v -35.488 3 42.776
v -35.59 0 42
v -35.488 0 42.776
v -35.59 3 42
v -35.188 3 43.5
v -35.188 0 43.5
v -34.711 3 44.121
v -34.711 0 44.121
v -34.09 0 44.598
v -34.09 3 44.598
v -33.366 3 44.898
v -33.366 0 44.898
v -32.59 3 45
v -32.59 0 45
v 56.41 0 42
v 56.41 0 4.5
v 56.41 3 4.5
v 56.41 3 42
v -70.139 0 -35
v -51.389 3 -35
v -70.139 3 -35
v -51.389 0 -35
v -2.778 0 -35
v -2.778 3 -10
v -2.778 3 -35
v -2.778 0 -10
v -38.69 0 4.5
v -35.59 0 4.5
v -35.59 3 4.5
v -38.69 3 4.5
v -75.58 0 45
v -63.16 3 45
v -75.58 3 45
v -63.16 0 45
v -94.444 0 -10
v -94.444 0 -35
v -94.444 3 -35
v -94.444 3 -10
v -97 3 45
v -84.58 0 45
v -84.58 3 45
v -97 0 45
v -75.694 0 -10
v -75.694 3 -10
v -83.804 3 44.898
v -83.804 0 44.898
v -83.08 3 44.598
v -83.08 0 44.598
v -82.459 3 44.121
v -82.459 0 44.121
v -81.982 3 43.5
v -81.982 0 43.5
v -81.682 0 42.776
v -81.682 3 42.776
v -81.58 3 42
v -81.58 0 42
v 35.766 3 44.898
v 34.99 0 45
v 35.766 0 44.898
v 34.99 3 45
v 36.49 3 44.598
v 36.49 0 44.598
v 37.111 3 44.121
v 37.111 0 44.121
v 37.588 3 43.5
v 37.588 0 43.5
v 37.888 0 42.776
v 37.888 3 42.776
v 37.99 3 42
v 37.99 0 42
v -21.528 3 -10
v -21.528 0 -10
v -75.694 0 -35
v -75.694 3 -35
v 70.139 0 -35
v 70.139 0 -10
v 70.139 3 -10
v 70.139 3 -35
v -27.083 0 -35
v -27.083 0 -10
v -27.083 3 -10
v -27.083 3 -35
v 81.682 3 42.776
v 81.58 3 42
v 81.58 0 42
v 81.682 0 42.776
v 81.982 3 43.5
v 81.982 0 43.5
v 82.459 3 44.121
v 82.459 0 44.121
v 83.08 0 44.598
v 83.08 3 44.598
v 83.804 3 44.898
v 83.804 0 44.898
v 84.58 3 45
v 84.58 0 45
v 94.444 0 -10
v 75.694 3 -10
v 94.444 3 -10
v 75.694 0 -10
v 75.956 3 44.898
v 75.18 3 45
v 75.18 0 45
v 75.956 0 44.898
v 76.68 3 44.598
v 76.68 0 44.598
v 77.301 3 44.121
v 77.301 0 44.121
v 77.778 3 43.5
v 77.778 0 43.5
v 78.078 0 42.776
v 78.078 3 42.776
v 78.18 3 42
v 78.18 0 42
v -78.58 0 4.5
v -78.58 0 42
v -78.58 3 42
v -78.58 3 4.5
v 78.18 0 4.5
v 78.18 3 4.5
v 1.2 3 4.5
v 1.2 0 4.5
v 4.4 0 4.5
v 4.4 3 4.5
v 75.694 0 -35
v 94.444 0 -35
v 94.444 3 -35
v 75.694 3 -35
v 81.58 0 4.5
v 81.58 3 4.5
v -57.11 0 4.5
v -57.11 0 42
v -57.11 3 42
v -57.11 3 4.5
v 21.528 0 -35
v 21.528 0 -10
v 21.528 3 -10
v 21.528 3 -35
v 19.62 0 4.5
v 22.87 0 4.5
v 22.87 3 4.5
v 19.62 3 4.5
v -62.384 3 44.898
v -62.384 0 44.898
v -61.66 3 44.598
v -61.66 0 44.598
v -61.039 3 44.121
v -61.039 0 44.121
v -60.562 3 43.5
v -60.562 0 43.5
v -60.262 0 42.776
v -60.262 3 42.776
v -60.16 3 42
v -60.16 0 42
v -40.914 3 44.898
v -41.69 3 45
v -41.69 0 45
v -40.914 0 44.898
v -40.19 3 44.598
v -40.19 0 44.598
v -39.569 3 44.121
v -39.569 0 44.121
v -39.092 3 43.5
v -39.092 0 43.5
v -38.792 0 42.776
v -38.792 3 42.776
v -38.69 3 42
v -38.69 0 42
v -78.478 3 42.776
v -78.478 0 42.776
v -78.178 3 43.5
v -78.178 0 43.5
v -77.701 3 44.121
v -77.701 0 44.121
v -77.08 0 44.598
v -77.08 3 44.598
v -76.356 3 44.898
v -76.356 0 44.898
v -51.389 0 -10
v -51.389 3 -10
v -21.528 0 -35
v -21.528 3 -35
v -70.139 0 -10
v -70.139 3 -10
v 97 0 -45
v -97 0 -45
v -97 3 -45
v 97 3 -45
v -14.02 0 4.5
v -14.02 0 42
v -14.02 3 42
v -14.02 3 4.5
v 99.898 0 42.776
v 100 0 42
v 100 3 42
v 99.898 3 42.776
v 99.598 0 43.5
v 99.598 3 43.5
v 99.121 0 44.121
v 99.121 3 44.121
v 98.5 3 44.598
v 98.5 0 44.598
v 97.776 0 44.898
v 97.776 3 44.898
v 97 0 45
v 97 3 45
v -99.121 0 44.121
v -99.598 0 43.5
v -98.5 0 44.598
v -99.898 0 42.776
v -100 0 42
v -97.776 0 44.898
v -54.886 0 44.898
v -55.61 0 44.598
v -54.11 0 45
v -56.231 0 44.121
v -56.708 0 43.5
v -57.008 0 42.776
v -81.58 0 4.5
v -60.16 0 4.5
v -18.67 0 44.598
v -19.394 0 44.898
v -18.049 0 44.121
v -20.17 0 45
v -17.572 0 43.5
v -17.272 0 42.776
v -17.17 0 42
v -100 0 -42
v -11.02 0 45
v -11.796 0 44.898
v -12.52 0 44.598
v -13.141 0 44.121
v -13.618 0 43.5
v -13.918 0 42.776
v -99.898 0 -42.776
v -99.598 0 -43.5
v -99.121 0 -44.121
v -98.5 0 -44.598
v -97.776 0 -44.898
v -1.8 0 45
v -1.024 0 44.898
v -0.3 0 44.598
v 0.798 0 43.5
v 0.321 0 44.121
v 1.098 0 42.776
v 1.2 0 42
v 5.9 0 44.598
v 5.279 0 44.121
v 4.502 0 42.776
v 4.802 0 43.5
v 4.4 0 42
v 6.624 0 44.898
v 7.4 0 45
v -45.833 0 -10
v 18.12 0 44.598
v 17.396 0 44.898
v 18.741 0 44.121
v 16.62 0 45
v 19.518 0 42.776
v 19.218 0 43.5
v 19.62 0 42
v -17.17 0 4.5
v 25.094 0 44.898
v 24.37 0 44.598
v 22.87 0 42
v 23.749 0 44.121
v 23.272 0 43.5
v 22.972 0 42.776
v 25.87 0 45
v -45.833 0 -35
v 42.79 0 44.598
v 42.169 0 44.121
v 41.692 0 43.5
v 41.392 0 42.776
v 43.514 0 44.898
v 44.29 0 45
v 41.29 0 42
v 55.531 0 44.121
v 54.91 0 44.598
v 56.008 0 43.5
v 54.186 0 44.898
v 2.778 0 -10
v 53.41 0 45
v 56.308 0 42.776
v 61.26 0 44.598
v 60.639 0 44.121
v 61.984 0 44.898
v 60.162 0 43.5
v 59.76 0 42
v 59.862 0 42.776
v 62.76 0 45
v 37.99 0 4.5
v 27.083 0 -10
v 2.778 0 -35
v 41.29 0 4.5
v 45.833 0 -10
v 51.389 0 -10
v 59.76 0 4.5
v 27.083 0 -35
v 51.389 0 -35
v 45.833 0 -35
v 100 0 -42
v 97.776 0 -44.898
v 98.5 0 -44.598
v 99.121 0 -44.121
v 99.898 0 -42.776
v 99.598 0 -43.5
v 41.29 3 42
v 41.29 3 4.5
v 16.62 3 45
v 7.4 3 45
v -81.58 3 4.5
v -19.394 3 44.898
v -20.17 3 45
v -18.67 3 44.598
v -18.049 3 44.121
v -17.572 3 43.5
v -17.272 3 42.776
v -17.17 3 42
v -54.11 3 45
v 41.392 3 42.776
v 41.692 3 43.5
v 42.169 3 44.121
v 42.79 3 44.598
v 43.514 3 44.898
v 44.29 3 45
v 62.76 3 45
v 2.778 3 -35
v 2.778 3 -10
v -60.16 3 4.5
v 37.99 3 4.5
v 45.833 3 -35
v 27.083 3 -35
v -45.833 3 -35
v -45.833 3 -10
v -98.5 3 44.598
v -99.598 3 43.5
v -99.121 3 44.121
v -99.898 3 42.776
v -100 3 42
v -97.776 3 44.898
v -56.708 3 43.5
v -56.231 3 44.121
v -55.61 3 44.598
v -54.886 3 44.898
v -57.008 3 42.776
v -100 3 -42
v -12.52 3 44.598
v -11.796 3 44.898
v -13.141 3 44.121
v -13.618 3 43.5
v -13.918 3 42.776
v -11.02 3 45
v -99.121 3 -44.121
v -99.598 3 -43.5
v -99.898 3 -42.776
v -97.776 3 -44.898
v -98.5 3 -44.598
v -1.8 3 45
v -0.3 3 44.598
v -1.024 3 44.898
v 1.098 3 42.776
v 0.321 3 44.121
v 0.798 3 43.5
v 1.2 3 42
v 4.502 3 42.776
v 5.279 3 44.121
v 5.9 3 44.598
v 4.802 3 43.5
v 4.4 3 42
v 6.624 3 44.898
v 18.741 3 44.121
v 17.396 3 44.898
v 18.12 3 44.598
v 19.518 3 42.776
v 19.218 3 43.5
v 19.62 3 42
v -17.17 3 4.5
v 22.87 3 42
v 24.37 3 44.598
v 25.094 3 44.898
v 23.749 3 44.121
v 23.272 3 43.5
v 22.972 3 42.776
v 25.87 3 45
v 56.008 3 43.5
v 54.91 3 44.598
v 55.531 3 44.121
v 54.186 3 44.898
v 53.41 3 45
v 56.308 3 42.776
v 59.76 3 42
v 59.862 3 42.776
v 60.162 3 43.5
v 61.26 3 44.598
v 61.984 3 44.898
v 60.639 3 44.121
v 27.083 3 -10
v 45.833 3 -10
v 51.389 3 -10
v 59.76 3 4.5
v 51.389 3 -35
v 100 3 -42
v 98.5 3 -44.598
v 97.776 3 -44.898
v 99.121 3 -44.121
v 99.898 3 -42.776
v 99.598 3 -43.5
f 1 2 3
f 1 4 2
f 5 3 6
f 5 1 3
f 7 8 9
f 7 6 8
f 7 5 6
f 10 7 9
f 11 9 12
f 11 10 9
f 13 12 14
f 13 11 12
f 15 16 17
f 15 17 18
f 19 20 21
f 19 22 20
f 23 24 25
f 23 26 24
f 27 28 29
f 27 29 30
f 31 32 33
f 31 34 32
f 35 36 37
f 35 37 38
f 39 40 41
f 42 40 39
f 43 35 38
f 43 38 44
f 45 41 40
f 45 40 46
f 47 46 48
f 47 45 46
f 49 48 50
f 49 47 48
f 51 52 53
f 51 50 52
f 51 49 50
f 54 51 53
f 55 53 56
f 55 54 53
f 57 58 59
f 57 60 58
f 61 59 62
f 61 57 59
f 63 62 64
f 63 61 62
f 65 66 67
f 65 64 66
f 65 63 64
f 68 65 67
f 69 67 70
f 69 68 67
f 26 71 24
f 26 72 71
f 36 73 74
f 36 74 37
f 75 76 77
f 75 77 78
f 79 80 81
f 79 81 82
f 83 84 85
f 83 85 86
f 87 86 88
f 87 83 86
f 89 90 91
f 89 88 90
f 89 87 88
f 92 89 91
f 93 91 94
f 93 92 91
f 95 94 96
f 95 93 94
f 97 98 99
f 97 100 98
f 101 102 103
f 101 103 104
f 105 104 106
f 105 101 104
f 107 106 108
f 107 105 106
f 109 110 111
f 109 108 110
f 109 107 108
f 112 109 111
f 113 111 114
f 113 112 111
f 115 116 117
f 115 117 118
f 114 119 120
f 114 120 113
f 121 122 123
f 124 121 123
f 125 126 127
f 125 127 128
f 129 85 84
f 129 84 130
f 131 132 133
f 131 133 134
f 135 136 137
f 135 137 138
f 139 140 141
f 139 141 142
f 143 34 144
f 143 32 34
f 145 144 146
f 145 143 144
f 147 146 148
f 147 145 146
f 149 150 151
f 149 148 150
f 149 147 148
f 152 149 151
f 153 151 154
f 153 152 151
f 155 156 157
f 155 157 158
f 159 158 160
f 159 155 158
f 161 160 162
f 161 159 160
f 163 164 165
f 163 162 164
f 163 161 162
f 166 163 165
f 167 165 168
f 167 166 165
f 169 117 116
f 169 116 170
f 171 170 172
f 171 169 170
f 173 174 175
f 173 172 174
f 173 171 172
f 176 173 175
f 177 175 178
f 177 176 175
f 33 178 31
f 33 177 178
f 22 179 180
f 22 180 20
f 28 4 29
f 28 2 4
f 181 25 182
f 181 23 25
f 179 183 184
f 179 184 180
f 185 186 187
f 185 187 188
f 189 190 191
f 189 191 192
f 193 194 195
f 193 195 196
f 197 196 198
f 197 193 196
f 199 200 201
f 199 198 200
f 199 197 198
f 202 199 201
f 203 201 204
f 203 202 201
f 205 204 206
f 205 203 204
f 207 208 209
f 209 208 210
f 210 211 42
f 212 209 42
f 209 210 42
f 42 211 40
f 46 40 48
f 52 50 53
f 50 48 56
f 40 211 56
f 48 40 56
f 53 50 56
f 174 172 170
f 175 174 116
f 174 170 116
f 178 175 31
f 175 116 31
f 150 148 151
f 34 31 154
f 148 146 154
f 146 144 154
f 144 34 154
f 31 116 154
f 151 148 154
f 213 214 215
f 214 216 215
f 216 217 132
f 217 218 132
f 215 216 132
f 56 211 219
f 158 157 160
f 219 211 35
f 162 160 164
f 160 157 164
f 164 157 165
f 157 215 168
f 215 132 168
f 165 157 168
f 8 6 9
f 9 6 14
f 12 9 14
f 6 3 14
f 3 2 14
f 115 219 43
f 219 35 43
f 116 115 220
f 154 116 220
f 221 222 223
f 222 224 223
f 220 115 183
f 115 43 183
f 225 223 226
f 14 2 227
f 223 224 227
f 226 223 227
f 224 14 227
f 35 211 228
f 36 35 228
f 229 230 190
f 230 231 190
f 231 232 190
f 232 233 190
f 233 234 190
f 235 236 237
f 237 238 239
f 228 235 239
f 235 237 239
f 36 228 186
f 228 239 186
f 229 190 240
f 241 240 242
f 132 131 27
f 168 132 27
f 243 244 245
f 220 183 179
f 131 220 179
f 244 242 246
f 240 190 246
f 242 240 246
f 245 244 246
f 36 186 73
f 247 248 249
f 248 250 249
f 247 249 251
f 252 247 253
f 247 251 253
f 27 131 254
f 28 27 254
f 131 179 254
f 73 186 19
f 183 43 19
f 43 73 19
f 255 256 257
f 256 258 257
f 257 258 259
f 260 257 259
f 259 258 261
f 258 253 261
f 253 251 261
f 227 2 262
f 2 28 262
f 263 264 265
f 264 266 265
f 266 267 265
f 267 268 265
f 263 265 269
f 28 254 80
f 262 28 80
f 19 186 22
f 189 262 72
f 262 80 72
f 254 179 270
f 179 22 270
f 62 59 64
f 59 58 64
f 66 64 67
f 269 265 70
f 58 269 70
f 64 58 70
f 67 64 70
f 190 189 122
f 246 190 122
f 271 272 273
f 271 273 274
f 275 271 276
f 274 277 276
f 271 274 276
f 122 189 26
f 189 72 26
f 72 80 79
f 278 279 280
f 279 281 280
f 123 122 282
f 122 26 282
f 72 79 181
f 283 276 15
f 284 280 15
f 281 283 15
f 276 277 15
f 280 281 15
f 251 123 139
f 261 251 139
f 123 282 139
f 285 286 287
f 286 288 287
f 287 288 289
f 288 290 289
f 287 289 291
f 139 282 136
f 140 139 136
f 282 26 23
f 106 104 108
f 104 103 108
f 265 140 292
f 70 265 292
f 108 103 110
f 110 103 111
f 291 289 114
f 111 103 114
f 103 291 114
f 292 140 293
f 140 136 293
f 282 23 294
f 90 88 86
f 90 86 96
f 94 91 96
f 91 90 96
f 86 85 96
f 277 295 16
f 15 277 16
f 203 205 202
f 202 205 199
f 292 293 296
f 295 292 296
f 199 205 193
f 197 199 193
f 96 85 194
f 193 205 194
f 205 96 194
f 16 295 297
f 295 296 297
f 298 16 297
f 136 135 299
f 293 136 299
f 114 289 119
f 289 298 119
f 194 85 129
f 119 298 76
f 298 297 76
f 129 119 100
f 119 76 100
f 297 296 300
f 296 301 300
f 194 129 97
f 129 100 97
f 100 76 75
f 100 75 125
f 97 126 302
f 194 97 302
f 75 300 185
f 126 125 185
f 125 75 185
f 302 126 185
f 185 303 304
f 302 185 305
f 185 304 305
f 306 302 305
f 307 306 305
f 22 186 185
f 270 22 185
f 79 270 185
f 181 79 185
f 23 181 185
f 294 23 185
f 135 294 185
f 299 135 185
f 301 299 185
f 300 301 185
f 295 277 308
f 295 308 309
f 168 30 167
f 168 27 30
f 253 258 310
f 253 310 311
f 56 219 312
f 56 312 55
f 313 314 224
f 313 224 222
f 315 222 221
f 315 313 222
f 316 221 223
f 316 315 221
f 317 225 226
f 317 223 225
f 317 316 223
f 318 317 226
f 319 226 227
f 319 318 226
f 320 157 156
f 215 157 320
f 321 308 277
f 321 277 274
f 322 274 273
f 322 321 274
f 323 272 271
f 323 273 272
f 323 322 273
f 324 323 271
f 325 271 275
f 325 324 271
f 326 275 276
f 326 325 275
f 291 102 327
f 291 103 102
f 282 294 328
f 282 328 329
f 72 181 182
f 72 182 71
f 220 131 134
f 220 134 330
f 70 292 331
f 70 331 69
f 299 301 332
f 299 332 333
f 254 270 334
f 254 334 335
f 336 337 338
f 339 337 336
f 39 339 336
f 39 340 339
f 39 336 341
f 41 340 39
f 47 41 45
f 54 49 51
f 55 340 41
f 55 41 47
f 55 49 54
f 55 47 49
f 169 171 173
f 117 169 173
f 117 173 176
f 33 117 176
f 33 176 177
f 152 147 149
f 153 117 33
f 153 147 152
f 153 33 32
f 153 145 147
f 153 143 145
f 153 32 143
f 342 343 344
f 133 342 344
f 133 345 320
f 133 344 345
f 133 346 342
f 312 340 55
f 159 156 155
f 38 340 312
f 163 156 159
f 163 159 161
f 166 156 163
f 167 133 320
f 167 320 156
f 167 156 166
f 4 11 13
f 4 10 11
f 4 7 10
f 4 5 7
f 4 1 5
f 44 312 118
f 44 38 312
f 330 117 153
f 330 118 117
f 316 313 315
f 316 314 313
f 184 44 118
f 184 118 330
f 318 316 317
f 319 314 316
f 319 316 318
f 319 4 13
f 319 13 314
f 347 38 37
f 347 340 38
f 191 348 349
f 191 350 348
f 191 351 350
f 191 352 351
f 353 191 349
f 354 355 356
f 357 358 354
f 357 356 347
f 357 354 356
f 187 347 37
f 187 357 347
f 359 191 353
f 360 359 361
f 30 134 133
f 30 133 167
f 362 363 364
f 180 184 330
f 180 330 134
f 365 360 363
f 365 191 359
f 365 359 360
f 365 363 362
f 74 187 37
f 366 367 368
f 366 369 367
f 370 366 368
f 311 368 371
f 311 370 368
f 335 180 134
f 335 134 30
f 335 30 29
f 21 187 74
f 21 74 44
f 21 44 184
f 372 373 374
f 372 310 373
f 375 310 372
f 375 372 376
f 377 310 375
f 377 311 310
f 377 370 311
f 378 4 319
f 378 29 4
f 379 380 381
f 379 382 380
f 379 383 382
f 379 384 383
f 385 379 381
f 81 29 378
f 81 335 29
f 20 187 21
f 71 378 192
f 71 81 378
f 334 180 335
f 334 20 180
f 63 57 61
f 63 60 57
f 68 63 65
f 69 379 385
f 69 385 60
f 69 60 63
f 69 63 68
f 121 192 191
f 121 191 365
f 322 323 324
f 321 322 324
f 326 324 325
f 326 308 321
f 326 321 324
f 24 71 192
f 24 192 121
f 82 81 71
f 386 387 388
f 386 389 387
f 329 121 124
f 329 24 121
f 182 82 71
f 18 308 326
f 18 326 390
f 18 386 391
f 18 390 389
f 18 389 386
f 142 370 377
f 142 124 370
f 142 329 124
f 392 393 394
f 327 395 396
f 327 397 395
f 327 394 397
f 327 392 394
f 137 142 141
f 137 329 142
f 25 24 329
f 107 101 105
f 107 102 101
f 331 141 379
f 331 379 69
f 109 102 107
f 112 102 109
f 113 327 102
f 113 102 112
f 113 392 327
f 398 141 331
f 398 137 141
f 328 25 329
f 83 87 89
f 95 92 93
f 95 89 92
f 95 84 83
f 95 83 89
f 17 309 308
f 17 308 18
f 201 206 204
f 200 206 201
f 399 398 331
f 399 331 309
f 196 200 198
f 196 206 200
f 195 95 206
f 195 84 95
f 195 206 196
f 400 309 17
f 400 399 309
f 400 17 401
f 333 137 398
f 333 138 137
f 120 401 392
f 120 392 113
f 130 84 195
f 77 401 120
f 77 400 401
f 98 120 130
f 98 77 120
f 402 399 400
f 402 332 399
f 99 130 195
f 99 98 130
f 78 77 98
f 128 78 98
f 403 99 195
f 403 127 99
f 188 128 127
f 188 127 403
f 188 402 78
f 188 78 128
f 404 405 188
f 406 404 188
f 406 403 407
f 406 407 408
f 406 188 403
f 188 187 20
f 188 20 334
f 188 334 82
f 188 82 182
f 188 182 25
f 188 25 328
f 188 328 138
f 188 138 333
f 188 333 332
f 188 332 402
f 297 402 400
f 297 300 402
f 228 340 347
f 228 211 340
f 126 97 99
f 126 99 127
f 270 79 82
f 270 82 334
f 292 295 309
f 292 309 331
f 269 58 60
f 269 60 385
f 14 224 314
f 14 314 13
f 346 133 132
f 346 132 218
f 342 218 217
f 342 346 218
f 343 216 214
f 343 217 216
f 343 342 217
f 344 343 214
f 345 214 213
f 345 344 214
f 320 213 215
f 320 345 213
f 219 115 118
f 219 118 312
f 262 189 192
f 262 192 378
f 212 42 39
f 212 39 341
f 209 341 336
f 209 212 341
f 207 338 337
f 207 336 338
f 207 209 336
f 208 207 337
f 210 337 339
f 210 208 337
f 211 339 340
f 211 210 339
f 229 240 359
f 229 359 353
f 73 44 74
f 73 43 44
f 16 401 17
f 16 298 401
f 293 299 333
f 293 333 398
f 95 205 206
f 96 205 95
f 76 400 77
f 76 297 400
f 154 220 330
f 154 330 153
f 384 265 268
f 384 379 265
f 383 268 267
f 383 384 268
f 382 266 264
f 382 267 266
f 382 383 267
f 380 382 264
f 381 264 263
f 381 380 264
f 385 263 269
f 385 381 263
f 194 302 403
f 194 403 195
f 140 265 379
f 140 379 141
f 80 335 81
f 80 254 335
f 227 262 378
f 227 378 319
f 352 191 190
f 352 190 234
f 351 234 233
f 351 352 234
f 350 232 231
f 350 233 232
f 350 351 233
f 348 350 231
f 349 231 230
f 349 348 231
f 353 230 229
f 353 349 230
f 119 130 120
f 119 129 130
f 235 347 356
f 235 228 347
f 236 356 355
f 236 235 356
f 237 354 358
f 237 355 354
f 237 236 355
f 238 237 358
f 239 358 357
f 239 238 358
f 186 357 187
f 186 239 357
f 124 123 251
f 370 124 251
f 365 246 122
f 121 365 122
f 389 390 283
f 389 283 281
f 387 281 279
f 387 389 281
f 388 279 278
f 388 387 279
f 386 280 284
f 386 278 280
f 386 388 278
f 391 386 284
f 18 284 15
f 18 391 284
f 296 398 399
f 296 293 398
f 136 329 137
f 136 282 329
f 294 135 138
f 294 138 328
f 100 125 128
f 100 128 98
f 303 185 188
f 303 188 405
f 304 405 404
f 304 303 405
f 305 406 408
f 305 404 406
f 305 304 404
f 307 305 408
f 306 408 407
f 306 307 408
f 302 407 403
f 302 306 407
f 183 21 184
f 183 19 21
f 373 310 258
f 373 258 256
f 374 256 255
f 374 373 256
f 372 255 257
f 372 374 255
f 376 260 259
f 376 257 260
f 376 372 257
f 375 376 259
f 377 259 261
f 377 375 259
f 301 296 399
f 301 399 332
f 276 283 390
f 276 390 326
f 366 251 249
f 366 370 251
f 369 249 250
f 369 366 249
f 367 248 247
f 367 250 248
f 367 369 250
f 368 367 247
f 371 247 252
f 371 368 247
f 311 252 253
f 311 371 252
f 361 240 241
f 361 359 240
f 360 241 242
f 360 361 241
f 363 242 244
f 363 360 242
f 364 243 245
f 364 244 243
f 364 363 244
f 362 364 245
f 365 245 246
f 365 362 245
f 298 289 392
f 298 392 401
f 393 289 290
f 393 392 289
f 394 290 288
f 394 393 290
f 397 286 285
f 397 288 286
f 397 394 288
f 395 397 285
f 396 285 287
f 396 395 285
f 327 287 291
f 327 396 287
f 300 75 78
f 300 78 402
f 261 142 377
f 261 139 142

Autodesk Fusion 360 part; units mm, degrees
sketch "Sketch1" plane through (0, 0, 0) normal (0, 1, 0) x (1, 0, 0)
  line L0 (-97, 45) -> (97, 45)
  line L1 (100, 42) -> (100, -42)
  line L2 (97, -45) -> (-97, -45)
  line L3 (-100, -42) -> (-100, 42)
  line L4 (-100, 45) -> (100, -45) construction
  line L5 (100, 45) -> (-100, -45) construction
  arc A0 (-100, -42) -> (-97, -45) centre (-97, -42) ccw
  arc A1 (97, -45) -> (100, -42) centre (97, -42) ccw
  arc A2 (100, 42) -> (97, 45) centre (97, 42) ccw
  arc A3 (-97, 45) -> (-100, 42) centre (-97, 42) ccw
  line L6 (-94.4444, 10) -> (-75.6944, 10)
  line L7 (-75.6944, 10) -> (-75.6944, 35)
  line L8 (-75.6944, 35) -> (-94.4444, 35)
  line L9 (-94.4444, 35) -> (-94.4444, 10)
  line L10 (-70.1389, 10) -> (-51.3889, 10)
  line L11 (-70.1389, 35) -> (-70.1389, 10)
  line L12 (-51.3889, 10) -> (-51.3889, 35)
  line L13 (-51.3889, 35) -> (-70.1389, 35)
  line L14 (-45.8333, 10) -> (-27.0833, 10)
  line L15 (-45.8333, 35) -> (-45.8333, 10)
  line L16 (-27.0833, 10) -> (-27.0833, 35)
  line L17 (-27.0833, 35) -> (-45.8333, 35)
  line L18 (-21.5278, 10) -> (-2.7778, 10)
  line L19 (-21.5278, 35) -> (-21.5278, 10)
  line L20 (-2.7778, 10) -> (-2.7778, 35)
  line L21 (-2.7778, 35) -> (-21.5278, 35)
  line L22 (2.7778, 10) -> (21.5278, 10)
  line L23 (2.7778, 35) -> (2.7778, 10)
  line L24 (21.5278, 10) -> (21.5278, 35)
  line L25 (21.5278, 35) -> (2.7778, 35)
  line L26 (27.0833, 10) -> (45.8333, 10)
  line L27 (27.0833, 35) -> (27.0833, 10)
  line L28 (45.8333, 10) -> (45.8333, 35)
  line L29 (45.8333, 35) -> (27.0833, 35)
  line L30 (51.3889, 10) -> (70.1389, 10)
  line L31 (51.3889, 35) -> (51.3889, 10)
  line L32 (70.1389, 10) -> (70.1389, 35)
  line L33 (70.1389, 35) -> (51.3889, 35)
  line L34 (75.6944, 10) -> (94.4444, 10)
  line L35 (75.6944, 35) -> (75.6944, 10)
  line L36 (94.4444, 10) -> (94.4444, 35)
  line L37 (94.4444, 35) -> (75.6944, 35)
  line L38 (-81.58, -45) -> (-78.58, -45)
  line L39 (-78.58, -45) -> (-78.58, -4.5)
  line L40 (-78.58, -4.5) -> (-81.58, -4.5)
  line L41 (-81.58, -4.5) -> (-81.58, -45)
  line L42 (-60.16, -45) -> (-57.11, -45)
  line L43 (-57.11, -45) -> (-57.11, -4.5)
  line L44 (-57.11, -4.5) -> (-60.16, -4.5)
  line L45 (-60.16, -4.5) -> (-60.16, -45)
  line L46 (-38.69, -45) -> (-35.59, -45)
  line L47 (-35.59, -45) -> (-35.59, -4.5)
  line L48 (-35.59, -4.5) -> (-38.69, -4.5)
  line L49 (-38.69, -4.5) -> (-38.69, -45)
  line L50 (-17.17, -45) -> (-14.02, -45)
  line L51 (-14.02, -45) -> (-14.02, -4.5)
  line L52 (-14.02, -4.5) -> (-17.17, -4.5)
  line L53 (-17.17, -4.5) -> (-17.17, -45)
  line L54 (4.4, -45) -> (1.2, -45)
  line L55 (1.2, -45) -> (1.2, -4.5)
  line L56 (1.2, -4.5) -> (4.4, -4.5)
  line L57 (4.4, -4.5) -> (4.4, -45)
  line L58 (19.62, -45) -> (22.87, -45)
  line L59 (22.87, -45) -> (22.87, -4.5)
  line L60 (22.87, -4.5) -> (19.62, -4.5)
  line L61 (19.62, -4.5) -> (19.62, -45)
  line L62 (56.41, -45) -> (59.76, -45)
  line L63 (59.76, -45) -> (59.76, -4.5)
  line L64 (59.76, -4.5) -> (56.41, -4.5)
  line L65 (56.41, -4.5) -> (56.41, -45)
  line L66 (78.18, -45) -> (81.58, -45)
  line L67 (81.58, -45) -> (81.58, -4.5)
  line L68 (81.58, -4.5) -> (78.18, -4.5)
  line L69 (78.18, -4.5) -> (78.18, -45)
  line L70 (37.99, -45) -> (41.29, -45)
  line L71 (41.29, -45) -> (41.29, -4.5)
  line L72 (41.29, -4.5) -> (37.99, -4.5)
  line L73 (37.99, -4.5) -> (37.99, -45)
  line L74 (-100, -24.75) -> (-81.58, -24.75) construction
  line L75 (-57.11, -24.75) -> (-38.69, -24.75) construction
  line L76 (-35.59, -24.75) -> (-17.17, -24.75) construction
  line L77 (-14.02, -24.75) -> (4.4, -24.75) construction
  line L78 (1.2, -24.75) -> (19.62, -24.75) construction
  line L79 (22.87, -24.75) -> (41.29, -24.75) construction
  line L80 (37.99, -24.75) -> (56.41, -24.75) construction
  line L81 (59.76, -24.75) -> (78.18, -24.75) construction
  line L82 (81.58, -24.75) -> (100, -24.75) construction
  line L83 (-78.58, -24.75) -> (-60.16, -24.75) construction
  dimension "d8" = 3
  dimension "d9" = 90
  dimension "d10" = 200
  dimension "d16" = 5.5556
  dimension "d17" = 10
  dimension "d18" = 10
  dimension "d19" = 18.75
  dimension "d22" = 24.3056
  dimension "d23" = 0
  dimension "d24" = 3
  dimension "d25" = 40.5
  dimension "d26" = 3.05
  dimension "d27" = 3.1
  dimension "d28" = 3.15
  dimension "d29" = 3.2
  dimension "d30" = 3.25
  dimension "d31" = 3.3
  dimension "d32" = 3.35
  dimension "d33" = 3.4
extrude "Extrude1" add sketch "Sketch1" along normal blind 3 contours L0 L1 L2 L3 A0 A1 A2 A3 L39 L40 L41 L43 L44 L45 L47 L48 L49 L51 L52 L53 L55 L56 L57 L59 L60 L61 L63 L64 L65 L67 L68 L69 L71 L72 L73
fillet "Fillet1" radius 3 18 edges at (-81.58, 1.5, 45) (-78.58, 1.5, 45) (-60.16, 1.5, 45) (-57.11, 1.5, 45) (-35.59, 1.5, 45) (-38.69, 1.5, 45) (-14.02, 1.5, 45) (-17.17, 1.5, 45) (1.2, 1.5, 45) (4.4, 1.5, 45) (19.62, 1.5, 45) (22.87, 1.5, 45) (37.99, 1.5, 45) (41.29, 1.5, 45) (56.41, 1.5, 45) (59.76, 1.5, 45) (78.18, 1.5, 45) (81.58, 1.5, 45)
sketch "Sketch2" plane through (0, 0, 0) normal (0, -1, 0) x (1, 0, 0)
  line L0 (94.4444, -35) -> (75.6944, -35)
  line L1 (75.6944, -35) -> (75.6944, -10)
  line L2 (75.6944, -10) -> (94.4444, -10)
  line L3 (94.4444, -10) -> (94.4444, -35)
  line L4 (-94.4444, -35) -> (-94.4444, -10)
  line L5 (-94.4444, -10) -> (-75.6944, -10)
  line L6 (-75.6944, -10) -> (-75.6944, -35)
  line L7 (-75.6944, -35) -> (-94.4444, -35)
  line L8 (70.1389, -35) -> (51.3889, -35)
  line L9 (51.3889, -35) -> (51.3889, -10)
  line L10 (51.3889, -10) -> (70.1389, -10)
  line L11 (70.1389, -10) -> (70.1389, -35)
  line L12 (-2.7778, -35) -> (-21.5278, -35)
  line L13 (-21.5278, -35) -> (-21.5278, -10)
  line L14 (-21.5278, -10) -> (-2.7778, -10)
  line L15 (-2.7778, -10) -> (-2.7778, -35)
  line L16 (21.5278, -35) -> (2.7778, -35)
  line L17 (2.7778, -35) -> (2.7778, -10)
  line L18 (2.7778, -10) -> (21.5278, -10)
  line L19 (21.5278, -10) -> (21.5278, -35)
  line L20 (-51.3889, -35) -> (-70.1389, -35)
  line L21 (-70.1389, -35) -> (-70.1389, -10)
  line L22 (-70.1389, -10) -> (-51.3889, -10)
  line L23 (-51.3889, -10) -> (-51.3889, -35)
  line L24 (-27.0833, -35) -> (-45.8333, -35)
  line L25 (-45.8333, -35) -> (-45.8333, -10)
  line L26 (-45.8333, -10) -> (-27.0833, -10)
  line L27 (-27.0833, -10) -> (-27.0833, -35)
  line L28 (45.8333, -35) -> (27.0833, -35)
  line L29 (27.0833, -35) -> (27.0833, -10)
  line L30 (27.0833, -10) -> (45.8333, -10)
  line L31 (45.8333, -10) -> (45.8333, -35)
  arc A0 (84.58, 45) -> (81.58, 42) centre (84.58, 42) ccw
  line L32 (81.58, 42) -> (81.58, 4.5)
  line L33 (81.58, 4.5) -> (78.18, 4.5)
  line L34 (78.18, 4.5) -> (78.18, 42)
  arc A1 (78.18, 42) -> (75.18, 45) centre (75.18, 42) ccw
  line L35 (75.18, 45) -> (62.76, 45)
  arc A2 (62.76, 45) -> (59.76, 42) centre (62.76, 42) ccw
  line L36 (59.76, 42) -> (59.76, 4.5)
  line L37 (59.76, 4.5) -> (56.41, 4.5)
  line L38 (56.41, 4.5) -> (56.41, 42)
  arc A3 (56.41, 42) -> (53.41, 45) centre (53.41, 42) ccw
  line L39 (53.41, 45) -> (44.29, 45)
  arc A4 (44.29, 45) -> (41.29, 42) centre (44.29, 42) ccw
  line L40 (41.29, 42) -> (41.29, 4.5)
  line L41 (41.29, 4.5) -> (37.99, 4.5)
  line L42 (37.99, 4.5) -> (37.99, 42)
  arc A5 (37.99, 42) -> (34.99, 45) centre (34.99, 42) ccw
  line L43 (34.99, 45) -> (25.87, 45)
  arc A6 (25.87, 45) -> (22.87, 42) centre (25.87, 42) ccw
  line L44 (22.87, 42) -> (22.87, 4.5)
  line L45 (22.87, 4.5) -> (19.62, 4.5)
  line L46 (19.62, 4.5) -> (19.62, 42)
  arc A7 (19.62, 42) -> (16.62, 45) centre (16.62, 42) ccw
  line L47 (16.62, 45) -> (7.4, 45)
  arc A8 (7.4, 45) -> (4.4, 42) centre (7.4, 42) ccw
  line L48 (4.4, 42) -> (4.4, 4.5)
  line L49 (4.4, 4.5) -> (1.2, 4.5)
  line L50 (1.2, 4.5) -> (1.2, 42)
  arc A9 (1.2, 42) -> (-1.8, 45) centre (-1.8, 42) ccw
  line L51 (-1.8, 45) -> (-11.02, 45)
  arc A10 (-11.02, 45) -> (-14.02, 42) centre (-11.02, 42) ccw
  line L52 (-14.02, 42) -> (-14.02, 4.5)
  line L53 (-14.02, 4.5) -> (-17.17, 4.5)
  line L54 (-17.17, 4.5) -> (-17.17, 42)
  arc A11 (-17.17, 42) -> (-20.17, 45) centre (-20.17, 42) ccw
  line L55 (-20.17, 45) -> (-32.59, 45)
  arc A12 (-32.59, 45) -> (-35.59, 42) centre (-32.59, 42) ccw
  line L56 (-35.59, 42) -> (-35.59, 4.5)
  line L57 (-35.59, 4.5) -> (-38.69, 4.5)
  line L58 (-38.69, 4.5) -> (-38.69, 42)
  arc A13 (-38.69, 42) -> (-41.69, 45) centre (-41.69, 42) ccw
  line L59 (-41.69, 45) -> (-54.11, 45)
  arc A14 (-54.11, 45) -> (-57.11, 42) centre (-54.11, 42) ccw
  line L60 (-57.11, 42) -> (-57.11, 4.5)
  line L61 (-57.11, 4.5) -> (-60.16, 4.5)
  line L62 (-60.16, 4.5) -> (-60.16, 42)
  arc A15 (-60.16, 42) -> (-63.16, 45) centre (-63.16, 42) ccw
  line L63 (-63.16, 45) -> (-75.58, 45)
  arc A16 (-75.58, 45) -> (-78.58, 42) centre (-75.58, 42) ccw
  line L64 (-78.58, 42) -> (-78.58, 4.5)
  line L65 (-78.58, 4.5) -> (-81.58, 4.5)
  line L66 (-81.58, 4.5) -> (-81.58, 42)
  arc A17 (-81.58, 42) -> (-84.58, 45) centre (-84.58, 42) ccw
  line L67 (-84.58, 45) -> (-97, 45)
  arc A18 (-97, 45) -> (-100, 42) centre (-97, 42) ccw
  line L68 (-100, 42) -> (-100, -42)
  arc A19 (-100, -42) -> (-97, -45) centre (-97, -42) ccw
  line L69 (-97, -45) -> (97, -45)
  arc A20 (97, -45) -> (100, -42) centre (97, -42) ccw
  line L70 (100, -42) -> (100, 42)
  arc A21 (100, 42) -> (97, 45) centre (97, 42) ccw
  line L71 (97, 45) -> (84.58, 45)
equation "Wbox = 200 mm" comment "Width of bounding box"
equation "Hbox = 90 mm" comment "Height of box"
equation "Thickness = 3 mm" comment "Thickness of stock used"
equation "Kerfincrement = 0.05 mm" comment "the value with which the kerf is increased"
equation "Diameter = 5 mm" comment "Dia of hole"
equation "Fillet = 3 mm" comment "Fillet around bouding box"
equation "Kerfsteps = 6 mm"
equation "d8 = Fillet"
equation "d9 = Hbox"
equation "d10 = Wbox"
equation "PScount = 8" comment "No of power boxes"
equation "PSwidth = ( Wbox * 0.75 ) / PScount" comment "powerbox width"
equation "PSgap = ( Wbox - ( PSwidth * PScount ) ) / ( PScount + 1 )" comment "gap b/w power boxes"
equation "d16 = PSgap"
equation "d17 = Wbox * 0.05"
equation "d18 = Wbox * 0.05"
equation "d19 = PSwidth"
equation "d20 = PScount"
equation "d22 = PSwidth + PSgap"
equation "d24 = Thickness"
equation "d25 = 0.45 * Hbox"
equation "d26 = Thickness + ( 1 * Kerfincrement )"
equation "d27 = Thickness + ( 2 * Kerfincrement )"
equation "d28 = Thickness + ( 3 * Kerfincrement )"
equation "d29 = Thickness + ( 4 * Kerfincrement )"
equation "d30 = Thickness + ( 5 * Kerfincrement )"
equation "d31 = Thickness + ( 6 * Kerfincrement )"
equation "d32 = Thickness + ( 7 * Kerfincrement )"
equation "d33 = Thickness + ( 8 * Kerfincrement )"
equation "d34 = Thickness"
equation "d37 = Fillet"
